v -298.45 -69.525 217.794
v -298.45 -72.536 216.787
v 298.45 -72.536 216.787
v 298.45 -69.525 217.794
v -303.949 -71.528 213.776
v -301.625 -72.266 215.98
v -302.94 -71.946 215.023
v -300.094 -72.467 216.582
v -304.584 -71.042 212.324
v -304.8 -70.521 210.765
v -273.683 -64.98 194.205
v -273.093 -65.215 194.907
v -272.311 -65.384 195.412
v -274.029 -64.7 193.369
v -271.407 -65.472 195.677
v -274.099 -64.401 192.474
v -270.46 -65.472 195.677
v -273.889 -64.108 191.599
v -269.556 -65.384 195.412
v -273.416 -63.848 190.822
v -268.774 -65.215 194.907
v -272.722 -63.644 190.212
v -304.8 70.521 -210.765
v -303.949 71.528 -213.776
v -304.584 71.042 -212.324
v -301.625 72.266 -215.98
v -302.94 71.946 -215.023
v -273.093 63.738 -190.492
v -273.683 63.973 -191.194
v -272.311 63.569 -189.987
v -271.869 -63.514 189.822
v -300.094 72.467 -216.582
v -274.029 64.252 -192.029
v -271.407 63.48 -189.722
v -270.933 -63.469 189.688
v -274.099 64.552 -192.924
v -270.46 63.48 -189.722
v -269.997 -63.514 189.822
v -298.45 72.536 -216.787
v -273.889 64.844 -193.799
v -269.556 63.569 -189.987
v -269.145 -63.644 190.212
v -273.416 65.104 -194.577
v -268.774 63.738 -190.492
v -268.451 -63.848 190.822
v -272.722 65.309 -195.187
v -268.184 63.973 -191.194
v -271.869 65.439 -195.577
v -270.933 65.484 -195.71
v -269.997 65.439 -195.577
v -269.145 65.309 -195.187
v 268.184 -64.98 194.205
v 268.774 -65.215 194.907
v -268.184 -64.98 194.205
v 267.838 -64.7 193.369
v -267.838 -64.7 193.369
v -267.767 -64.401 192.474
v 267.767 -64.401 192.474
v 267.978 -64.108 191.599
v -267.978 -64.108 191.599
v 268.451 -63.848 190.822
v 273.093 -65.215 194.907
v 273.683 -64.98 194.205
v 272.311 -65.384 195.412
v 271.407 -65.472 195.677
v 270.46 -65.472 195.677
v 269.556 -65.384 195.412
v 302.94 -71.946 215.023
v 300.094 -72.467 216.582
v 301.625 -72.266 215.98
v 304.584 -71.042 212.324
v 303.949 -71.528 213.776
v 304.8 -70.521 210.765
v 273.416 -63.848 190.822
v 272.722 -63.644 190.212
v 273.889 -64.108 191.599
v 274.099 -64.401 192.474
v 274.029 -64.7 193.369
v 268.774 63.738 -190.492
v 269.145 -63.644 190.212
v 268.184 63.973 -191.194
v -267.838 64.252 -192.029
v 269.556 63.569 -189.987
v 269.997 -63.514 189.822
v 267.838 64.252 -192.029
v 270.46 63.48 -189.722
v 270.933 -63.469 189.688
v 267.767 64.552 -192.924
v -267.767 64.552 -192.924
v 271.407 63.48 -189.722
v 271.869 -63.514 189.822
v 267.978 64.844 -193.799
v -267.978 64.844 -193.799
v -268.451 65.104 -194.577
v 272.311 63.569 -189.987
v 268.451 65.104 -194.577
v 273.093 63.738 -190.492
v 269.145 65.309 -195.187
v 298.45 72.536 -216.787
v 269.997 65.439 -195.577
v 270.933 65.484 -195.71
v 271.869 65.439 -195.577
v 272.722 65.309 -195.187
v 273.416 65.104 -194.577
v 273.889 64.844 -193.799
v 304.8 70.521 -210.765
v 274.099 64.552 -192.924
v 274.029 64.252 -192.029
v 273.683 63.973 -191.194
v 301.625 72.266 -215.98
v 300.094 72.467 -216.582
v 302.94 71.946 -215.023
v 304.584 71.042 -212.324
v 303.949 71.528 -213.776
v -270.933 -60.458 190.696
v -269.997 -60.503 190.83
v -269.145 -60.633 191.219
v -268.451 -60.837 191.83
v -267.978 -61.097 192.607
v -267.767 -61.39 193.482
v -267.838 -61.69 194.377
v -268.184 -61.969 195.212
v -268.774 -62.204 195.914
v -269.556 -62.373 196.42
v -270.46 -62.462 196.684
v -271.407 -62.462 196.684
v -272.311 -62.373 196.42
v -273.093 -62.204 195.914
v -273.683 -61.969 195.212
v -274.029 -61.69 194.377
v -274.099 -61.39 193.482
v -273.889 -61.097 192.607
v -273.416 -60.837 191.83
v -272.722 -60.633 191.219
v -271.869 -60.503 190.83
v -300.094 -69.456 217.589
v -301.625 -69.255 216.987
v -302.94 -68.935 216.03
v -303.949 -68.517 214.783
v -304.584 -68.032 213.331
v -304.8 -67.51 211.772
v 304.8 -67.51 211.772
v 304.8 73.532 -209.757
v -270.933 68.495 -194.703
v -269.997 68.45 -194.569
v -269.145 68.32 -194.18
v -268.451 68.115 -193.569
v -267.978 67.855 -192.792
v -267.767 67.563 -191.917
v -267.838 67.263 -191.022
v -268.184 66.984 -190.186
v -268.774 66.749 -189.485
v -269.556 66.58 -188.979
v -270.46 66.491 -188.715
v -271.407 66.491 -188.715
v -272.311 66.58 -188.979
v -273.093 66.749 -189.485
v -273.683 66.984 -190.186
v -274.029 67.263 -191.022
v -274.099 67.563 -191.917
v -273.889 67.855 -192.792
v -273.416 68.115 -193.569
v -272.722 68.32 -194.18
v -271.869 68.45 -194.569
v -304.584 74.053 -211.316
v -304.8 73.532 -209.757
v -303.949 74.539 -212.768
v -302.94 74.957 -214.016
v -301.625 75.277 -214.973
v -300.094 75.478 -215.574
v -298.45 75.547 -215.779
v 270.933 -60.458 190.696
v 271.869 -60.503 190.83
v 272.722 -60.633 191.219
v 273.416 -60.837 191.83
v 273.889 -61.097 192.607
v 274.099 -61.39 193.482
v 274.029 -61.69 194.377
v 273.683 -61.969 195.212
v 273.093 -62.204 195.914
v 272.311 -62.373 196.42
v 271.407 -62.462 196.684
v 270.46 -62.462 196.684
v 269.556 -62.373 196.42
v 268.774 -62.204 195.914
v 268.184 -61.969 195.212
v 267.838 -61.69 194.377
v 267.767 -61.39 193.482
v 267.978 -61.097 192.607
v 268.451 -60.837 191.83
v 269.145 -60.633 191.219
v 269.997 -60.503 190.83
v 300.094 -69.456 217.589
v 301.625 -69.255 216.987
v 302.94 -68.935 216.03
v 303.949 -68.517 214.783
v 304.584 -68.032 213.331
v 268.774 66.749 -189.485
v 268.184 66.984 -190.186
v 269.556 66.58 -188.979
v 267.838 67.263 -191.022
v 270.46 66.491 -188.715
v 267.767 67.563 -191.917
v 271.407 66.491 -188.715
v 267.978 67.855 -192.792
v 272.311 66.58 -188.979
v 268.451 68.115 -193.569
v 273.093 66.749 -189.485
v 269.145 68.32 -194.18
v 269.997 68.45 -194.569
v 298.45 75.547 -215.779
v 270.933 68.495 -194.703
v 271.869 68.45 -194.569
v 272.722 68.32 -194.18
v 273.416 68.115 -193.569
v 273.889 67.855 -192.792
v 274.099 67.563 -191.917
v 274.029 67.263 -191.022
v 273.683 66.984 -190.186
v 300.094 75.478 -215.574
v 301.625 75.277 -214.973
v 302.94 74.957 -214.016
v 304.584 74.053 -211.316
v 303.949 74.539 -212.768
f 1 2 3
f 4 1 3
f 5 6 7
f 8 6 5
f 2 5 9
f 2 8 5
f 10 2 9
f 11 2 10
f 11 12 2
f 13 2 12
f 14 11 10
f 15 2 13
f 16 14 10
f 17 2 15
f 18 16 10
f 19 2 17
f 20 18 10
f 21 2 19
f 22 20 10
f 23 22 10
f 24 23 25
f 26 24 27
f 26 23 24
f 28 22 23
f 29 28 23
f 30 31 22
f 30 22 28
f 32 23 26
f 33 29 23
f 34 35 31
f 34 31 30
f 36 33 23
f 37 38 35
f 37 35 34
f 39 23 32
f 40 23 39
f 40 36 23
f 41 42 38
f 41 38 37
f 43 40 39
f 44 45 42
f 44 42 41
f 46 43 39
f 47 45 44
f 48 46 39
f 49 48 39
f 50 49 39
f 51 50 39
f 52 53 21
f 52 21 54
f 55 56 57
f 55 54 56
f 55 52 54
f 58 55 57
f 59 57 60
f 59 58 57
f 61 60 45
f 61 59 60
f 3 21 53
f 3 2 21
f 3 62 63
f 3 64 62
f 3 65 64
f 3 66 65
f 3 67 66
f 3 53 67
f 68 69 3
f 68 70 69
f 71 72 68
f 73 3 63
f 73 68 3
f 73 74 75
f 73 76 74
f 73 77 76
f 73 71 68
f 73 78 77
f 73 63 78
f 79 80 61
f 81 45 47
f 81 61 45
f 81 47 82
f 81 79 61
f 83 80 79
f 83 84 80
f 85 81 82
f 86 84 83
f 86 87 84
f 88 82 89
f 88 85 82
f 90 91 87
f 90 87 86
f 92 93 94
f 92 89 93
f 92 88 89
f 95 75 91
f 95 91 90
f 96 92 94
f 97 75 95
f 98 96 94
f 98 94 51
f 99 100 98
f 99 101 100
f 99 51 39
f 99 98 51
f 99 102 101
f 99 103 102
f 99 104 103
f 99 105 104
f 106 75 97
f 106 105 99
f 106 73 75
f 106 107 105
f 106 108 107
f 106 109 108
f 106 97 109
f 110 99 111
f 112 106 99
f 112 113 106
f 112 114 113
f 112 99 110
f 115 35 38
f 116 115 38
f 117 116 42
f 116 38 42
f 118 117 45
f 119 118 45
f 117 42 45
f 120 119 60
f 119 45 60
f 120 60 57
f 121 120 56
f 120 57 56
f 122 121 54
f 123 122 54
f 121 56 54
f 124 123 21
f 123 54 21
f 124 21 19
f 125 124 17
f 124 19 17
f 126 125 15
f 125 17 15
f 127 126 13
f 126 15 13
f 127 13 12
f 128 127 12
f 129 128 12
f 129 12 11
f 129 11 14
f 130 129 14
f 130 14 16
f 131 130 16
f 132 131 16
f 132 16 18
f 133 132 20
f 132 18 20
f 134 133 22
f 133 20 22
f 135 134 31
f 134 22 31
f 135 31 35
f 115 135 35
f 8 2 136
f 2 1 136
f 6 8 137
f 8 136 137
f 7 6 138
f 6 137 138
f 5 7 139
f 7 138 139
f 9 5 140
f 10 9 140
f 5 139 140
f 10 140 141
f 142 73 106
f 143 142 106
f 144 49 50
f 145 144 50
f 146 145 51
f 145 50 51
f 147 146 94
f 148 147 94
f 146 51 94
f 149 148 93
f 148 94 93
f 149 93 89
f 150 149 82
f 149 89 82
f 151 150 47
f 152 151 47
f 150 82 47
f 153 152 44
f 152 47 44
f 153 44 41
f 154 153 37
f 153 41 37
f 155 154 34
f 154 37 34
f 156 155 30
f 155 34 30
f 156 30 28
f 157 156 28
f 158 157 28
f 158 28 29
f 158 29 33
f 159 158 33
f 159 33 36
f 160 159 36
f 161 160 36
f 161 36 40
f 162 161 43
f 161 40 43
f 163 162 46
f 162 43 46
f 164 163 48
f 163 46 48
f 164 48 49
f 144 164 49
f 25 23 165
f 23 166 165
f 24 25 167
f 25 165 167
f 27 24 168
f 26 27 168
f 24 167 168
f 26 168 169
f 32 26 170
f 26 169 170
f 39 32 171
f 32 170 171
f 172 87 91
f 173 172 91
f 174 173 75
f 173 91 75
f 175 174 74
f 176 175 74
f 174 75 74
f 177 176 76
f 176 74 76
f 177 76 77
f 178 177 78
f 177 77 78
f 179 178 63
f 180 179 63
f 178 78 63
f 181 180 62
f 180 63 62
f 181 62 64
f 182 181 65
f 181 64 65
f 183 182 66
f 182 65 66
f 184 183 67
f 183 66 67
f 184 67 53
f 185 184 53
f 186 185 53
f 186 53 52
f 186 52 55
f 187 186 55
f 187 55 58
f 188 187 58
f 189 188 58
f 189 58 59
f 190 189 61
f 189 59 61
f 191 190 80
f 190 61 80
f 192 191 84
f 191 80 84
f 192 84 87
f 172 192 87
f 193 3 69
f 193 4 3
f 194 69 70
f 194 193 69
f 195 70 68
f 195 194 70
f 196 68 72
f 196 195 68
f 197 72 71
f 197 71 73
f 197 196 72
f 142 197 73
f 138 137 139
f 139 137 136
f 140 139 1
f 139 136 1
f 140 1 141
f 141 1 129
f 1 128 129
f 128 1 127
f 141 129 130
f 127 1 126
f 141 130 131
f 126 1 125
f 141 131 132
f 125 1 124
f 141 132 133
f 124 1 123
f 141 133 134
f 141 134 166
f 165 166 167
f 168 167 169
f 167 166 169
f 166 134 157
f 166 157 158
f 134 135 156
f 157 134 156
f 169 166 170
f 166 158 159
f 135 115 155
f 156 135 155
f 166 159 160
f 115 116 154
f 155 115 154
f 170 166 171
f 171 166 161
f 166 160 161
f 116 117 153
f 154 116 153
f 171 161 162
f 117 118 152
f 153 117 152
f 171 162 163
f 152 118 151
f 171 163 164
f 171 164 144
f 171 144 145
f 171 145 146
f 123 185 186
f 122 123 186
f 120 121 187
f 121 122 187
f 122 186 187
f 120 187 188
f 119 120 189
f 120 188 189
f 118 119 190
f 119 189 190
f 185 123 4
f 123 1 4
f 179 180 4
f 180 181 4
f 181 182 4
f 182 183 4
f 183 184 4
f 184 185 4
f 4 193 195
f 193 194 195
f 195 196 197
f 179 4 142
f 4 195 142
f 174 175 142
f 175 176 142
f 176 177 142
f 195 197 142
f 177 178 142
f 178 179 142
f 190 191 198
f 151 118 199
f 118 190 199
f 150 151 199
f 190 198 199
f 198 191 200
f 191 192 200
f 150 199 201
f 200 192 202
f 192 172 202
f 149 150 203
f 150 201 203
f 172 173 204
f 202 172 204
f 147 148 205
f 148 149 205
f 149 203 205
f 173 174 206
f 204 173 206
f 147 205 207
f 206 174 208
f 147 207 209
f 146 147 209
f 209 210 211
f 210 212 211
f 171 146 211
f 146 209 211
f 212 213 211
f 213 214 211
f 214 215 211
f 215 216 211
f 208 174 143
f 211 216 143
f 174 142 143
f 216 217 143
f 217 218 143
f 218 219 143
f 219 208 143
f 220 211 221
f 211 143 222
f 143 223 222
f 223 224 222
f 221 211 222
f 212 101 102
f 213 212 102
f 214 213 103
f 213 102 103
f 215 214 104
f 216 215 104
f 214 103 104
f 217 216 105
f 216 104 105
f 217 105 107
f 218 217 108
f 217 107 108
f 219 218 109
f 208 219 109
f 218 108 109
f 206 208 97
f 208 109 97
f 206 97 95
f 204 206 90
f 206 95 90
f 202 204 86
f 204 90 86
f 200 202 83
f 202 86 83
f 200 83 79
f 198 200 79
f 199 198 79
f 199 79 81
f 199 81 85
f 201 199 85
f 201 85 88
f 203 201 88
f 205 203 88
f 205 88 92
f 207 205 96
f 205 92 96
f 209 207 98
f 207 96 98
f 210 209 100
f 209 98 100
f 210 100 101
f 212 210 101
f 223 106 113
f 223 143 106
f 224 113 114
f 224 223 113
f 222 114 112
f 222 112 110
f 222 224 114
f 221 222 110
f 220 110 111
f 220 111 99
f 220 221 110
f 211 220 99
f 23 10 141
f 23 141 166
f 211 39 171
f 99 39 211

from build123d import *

# Parameters (mm, degrees)
SKETCH3_W           = 457.2
SKETCH3_H           = 609.6
SKETCH3_R           = 3.175
BOSS_EXTRUDE1_DEPTH = 3.175
FILLET1_R           = 6.35


with BuildPart() as part:
    # Sketch3 → Boss-Extrude1 (new body)
    with BuildSketch(Plane(origin=(0, 0, 0), x_dir=(0, 0.3173046564050865, -0.9483236552062013), z_dir=(0, -0.9483236552062012, -0.3173046564050864))):
        Rectangle(SKETCH3_W, SKETCH3_H)
        with Locations((203.2, -270.933333333)):
            Circle(SKETCH3_R, mode=Mode.SUBTRACT)
        with Locations((-203.2, -270.933333333)):
            Circle(SKETCH3_R, mode=Mode.SUBTRACT)
        with Locations((-203.2, 270.933333333)):
            Circle(SKETCH3_R, mode=Mode.SUBTRACT)
        with Locations((203.2, 270.933333333)):
            Circle(SKETCH3_R, mode=Mode.SUBTRACT)
    extrude(amount=-BOSS_EXTRUDE1_DEPTH)

    # Fillet1
    fillet1_edges = [part.edges().sort_by_distance(p)[0] for p in [
        (-304.8, 74.041308257, -216.283066438),
        (-304.8, -71.030380652, 217.290508722),
        (304.8, -71.030380652, 217.290508722),
        (304.8, 74.041308257, -216.283066438),
    ]]
    fillet(fillet1_edges, radius=FILLET1_R)


solid = part.part
